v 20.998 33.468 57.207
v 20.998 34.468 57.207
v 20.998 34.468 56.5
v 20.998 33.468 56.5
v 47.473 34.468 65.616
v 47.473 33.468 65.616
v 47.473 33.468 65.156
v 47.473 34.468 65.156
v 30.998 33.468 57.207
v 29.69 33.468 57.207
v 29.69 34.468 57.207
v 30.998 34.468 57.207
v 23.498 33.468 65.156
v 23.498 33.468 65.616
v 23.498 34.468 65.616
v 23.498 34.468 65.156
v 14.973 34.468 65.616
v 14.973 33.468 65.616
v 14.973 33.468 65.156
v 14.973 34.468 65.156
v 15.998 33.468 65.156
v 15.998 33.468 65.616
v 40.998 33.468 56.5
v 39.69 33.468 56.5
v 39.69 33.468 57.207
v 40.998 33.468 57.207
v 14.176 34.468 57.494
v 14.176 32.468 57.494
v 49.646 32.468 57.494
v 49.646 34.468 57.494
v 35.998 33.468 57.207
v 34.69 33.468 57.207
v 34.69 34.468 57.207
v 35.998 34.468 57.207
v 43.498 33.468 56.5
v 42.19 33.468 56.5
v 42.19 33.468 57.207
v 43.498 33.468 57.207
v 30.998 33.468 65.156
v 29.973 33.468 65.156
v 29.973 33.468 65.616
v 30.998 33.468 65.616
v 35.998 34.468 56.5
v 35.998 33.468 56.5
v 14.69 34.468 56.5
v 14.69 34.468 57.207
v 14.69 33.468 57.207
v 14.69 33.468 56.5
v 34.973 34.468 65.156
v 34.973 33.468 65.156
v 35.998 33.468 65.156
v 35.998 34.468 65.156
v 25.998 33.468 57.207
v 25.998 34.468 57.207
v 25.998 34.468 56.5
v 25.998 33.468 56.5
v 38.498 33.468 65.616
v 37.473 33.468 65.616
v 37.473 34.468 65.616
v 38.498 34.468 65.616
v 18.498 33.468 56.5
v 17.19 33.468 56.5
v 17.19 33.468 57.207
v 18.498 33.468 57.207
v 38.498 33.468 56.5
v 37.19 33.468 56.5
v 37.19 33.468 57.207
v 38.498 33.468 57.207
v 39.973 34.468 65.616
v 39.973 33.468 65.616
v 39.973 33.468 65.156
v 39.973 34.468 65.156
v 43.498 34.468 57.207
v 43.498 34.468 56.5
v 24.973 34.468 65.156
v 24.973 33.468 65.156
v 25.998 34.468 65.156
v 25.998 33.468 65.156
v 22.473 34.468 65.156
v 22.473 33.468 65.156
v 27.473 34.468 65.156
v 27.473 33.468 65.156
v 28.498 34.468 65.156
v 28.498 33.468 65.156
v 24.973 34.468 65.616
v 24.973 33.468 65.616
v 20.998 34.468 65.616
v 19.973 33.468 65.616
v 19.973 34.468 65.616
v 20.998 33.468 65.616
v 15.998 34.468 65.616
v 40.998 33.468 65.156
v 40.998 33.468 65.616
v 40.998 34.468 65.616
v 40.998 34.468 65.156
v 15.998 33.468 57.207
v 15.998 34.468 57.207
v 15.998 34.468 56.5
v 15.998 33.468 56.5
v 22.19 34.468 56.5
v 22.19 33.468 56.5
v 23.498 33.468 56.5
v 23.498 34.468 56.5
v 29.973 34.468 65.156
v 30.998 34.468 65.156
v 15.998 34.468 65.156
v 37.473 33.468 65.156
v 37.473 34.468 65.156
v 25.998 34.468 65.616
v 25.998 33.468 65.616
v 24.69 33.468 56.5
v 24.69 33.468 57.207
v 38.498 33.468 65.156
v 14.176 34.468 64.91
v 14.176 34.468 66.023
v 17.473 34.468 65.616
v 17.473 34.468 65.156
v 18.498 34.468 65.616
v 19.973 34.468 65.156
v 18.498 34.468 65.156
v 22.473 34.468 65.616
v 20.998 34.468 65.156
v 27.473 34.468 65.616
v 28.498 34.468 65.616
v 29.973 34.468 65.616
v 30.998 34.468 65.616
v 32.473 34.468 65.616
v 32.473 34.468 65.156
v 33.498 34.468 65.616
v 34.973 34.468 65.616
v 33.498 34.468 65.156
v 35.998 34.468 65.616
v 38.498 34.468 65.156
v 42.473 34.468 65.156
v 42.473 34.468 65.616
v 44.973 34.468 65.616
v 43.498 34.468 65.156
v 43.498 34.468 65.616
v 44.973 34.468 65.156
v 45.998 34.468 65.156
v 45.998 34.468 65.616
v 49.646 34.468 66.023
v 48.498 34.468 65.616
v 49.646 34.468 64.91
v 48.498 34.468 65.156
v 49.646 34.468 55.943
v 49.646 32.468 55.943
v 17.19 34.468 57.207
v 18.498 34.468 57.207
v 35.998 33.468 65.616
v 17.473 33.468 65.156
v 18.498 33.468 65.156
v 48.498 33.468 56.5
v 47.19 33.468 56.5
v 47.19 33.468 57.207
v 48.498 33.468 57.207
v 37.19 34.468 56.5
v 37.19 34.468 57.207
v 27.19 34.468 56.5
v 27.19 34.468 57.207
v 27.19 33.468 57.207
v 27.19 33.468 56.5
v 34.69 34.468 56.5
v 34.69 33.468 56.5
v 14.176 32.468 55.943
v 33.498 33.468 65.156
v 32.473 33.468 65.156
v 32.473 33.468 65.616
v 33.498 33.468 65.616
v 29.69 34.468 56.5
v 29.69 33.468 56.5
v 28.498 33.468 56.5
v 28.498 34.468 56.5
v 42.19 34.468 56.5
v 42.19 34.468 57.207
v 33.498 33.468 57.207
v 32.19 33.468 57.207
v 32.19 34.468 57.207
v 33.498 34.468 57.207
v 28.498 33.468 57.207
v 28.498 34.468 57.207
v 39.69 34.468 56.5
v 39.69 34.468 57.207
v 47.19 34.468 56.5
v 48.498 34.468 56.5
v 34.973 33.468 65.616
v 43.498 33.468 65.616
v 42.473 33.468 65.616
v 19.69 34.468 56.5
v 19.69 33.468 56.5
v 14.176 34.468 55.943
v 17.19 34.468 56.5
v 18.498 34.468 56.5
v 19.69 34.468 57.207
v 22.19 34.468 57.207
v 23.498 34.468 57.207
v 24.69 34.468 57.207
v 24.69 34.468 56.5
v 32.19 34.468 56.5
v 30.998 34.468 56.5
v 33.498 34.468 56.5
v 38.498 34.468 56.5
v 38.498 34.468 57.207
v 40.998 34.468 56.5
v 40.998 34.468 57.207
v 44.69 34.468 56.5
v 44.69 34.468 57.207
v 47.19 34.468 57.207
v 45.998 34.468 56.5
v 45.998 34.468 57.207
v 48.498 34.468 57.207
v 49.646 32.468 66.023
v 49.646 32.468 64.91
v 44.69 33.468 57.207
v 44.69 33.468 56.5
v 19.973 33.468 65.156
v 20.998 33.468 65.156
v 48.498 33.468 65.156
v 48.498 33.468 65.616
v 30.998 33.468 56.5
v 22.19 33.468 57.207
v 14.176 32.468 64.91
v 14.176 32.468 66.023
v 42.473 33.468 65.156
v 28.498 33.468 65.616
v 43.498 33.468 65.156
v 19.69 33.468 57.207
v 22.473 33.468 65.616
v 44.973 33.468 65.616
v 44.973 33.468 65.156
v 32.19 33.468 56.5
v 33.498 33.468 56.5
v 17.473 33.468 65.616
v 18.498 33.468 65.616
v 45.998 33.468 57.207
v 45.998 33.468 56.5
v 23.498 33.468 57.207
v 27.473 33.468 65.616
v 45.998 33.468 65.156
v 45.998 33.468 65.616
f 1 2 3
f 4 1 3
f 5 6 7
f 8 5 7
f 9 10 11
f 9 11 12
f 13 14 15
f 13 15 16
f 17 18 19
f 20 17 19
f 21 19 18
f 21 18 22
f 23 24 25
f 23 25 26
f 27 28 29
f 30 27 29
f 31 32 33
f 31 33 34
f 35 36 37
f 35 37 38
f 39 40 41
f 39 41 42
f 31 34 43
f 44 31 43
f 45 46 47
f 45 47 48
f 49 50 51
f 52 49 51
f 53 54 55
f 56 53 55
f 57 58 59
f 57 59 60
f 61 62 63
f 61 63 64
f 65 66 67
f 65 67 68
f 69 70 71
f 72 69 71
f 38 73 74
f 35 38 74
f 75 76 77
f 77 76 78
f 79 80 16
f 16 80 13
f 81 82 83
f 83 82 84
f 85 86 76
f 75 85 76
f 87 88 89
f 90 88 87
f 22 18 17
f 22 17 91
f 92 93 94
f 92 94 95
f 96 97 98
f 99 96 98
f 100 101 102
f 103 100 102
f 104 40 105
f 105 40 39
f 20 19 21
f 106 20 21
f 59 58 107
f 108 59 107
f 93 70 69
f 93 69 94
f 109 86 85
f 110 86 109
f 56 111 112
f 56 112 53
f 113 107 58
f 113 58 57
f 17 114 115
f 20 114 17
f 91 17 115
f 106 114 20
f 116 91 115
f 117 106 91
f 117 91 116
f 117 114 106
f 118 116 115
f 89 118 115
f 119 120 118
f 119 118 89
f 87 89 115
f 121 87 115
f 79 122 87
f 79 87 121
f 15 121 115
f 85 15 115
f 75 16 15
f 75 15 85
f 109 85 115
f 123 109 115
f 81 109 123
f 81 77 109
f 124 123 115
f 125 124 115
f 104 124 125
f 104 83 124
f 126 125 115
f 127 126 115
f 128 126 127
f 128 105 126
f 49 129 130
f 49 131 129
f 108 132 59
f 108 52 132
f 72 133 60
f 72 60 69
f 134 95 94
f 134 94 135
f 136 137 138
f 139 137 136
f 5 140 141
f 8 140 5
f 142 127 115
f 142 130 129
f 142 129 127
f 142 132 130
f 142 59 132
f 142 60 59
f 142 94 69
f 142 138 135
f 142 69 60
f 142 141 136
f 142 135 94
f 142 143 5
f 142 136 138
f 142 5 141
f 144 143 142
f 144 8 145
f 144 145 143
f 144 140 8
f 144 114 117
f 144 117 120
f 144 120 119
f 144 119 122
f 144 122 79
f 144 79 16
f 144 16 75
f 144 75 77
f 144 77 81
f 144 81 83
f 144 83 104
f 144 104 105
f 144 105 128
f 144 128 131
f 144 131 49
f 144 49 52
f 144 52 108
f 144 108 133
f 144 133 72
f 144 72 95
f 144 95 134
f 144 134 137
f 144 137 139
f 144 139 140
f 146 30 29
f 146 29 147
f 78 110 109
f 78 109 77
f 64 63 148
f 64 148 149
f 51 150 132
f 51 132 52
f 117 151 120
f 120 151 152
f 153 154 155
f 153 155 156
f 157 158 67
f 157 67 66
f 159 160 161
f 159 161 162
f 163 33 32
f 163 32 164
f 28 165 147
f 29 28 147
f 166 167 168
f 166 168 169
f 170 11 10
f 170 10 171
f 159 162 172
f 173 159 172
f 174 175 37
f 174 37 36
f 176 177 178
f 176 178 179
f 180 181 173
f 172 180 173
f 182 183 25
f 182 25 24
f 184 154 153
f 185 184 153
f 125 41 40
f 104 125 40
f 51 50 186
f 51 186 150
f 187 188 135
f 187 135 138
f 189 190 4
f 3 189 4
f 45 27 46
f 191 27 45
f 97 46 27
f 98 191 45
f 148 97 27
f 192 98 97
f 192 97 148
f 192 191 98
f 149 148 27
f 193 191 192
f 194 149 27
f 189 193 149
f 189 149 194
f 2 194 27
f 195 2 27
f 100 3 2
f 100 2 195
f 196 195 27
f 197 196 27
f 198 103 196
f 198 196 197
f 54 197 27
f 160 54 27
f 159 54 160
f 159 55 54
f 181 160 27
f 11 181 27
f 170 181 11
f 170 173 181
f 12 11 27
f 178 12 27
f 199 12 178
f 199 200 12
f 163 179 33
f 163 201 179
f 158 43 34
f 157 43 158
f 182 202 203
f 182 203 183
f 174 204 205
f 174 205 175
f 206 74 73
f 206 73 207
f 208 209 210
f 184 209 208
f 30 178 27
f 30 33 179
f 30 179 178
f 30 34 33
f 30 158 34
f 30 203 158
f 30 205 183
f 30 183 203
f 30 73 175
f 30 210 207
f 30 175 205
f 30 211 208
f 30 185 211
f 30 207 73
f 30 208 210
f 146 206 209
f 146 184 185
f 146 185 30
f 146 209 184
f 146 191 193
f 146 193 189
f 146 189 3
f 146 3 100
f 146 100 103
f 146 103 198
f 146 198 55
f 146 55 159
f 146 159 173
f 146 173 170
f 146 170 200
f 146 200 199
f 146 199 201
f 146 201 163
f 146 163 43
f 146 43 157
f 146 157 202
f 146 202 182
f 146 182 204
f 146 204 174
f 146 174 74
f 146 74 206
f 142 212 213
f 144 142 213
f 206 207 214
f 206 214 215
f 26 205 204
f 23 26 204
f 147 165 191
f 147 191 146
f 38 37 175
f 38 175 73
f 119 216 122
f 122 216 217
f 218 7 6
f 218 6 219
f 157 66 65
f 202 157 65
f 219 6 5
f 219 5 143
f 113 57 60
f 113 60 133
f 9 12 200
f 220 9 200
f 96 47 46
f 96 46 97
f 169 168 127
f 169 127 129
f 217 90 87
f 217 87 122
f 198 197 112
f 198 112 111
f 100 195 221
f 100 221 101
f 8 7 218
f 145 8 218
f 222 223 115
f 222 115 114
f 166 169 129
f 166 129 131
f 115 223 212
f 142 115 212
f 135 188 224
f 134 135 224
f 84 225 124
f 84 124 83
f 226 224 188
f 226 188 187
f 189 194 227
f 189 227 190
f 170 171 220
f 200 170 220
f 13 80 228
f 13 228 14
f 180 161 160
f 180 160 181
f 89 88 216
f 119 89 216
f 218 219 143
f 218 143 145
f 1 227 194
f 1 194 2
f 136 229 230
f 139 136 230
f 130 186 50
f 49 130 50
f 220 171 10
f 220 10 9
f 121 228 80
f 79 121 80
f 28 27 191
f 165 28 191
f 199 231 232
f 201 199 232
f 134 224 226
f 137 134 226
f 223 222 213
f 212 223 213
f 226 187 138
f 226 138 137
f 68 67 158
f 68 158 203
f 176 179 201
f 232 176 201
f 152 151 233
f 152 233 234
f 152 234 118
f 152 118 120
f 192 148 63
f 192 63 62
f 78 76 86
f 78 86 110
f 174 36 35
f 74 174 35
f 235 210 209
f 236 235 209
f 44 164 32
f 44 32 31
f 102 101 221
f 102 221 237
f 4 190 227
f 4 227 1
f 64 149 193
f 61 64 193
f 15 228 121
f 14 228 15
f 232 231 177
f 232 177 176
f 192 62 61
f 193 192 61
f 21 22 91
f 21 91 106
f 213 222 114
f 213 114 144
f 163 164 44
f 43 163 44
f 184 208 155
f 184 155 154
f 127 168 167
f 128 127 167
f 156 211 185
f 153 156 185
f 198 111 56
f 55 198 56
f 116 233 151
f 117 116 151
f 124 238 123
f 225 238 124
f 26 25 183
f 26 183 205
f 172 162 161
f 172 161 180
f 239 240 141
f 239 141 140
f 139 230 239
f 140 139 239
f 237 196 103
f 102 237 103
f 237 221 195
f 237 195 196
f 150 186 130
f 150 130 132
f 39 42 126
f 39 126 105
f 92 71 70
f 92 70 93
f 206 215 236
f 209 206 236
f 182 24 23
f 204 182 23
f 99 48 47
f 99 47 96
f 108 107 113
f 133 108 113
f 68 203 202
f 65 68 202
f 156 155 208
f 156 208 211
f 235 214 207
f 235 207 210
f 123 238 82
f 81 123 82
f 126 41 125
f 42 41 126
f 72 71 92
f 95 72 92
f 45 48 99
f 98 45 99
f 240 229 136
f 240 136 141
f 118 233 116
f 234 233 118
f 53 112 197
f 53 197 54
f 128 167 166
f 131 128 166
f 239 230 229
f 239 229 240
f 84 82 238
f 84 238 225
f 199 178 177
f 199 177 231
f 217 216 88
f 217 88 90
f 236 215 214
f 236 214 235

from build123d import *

# Parameters (mm, degrees)
CROQUIS1_W                = 35.470504615
CROQUIS1_H                = 1.551006647
CROQUIS1_W_2              = 1.307281122
CROQUIS1_H_2              = 0.706638445
SALIENTE_EXTRUIR1_DEPTH   = 2
CROQUIS1_H_3              = 1.112257887
CROQUIS1_W_3              = 1.024625744
CROQUIS1_H_4              = 0.459314989
SALIENTE_EXTRUIR1_2_DEPTH = 2
CROQUIS1_3_W              = 1.307281122
CROQUIS1_3_H              = 0.706638445
CROQUIS1_3_W_2            = 1.024625744
CROQUIS1_3_H_2            = 0.459314989
SALIENTE_EXTRUIR2_DEPTH   = 1


with BuildPart() as part:
    # Croquis1 → Saliente-Extruir1 (new body)
    with BuildSketch(Plane(origin=(0, 32.468175746, 0), x_dir=(1, 0, 0), z_dir=(0, 1, 0))):
        with Locations((31.911205321, -56.71845489)):
            Rectangle(CROQUIS1_W, CROQUIS1_H)
        with Locations((17.844131363, -56.853250782)):
            Rectangle(CROQUIS1_W_2, CROQUIS1_H_2, mode=Mode.SUBTRACT)
        with Locations((15.344131363, -56.853250782)):
            Rectangle(CROQUIS1_W_2, CROQUIS1_H_2, mode=Mode.SUBTRACT)
        with Locations((20.344131363, -56.853250782)):
            Rectangle(CROQUIS1_W_2, CROQUIS1_H_2, mode=Mode.SUBTRACT)
        with Locations((22.844131363, -56.853250782)):
            Rectangle(CROQUIS1_W_2, CROQUIS1_H_2, mode=Mode.SUBTRACT)
        with Locations((25.344131363, -56.853250782)):
            Rectangle(CROQUIS1_W_2, CROQUIS1_H_2, mode=Mode.SUBTRACT)
        with Locations((27.844131363, -56.853250782)):
            Rectangle(CROQUIS1_W_2, CROQUIS1_H_2, mode=Mode.SUBTRACT)
        with Locations((30.344131363, -56.853250782)):
            Rectangle(CROQUIS1_W_2, CROQUIS1_H_2, mode=Mode.SUBTRACT)
        with Locations((32.844131363, -56.853250782)):
            Rectangle(CROQUIS1_W_2, CROQUIS1_H_2, mode=Mode.SUBTRACT)
        with Locations((35.344131363, -56.853250782)):
            Rectangle(CROQUIS1_W_2, CROQUIS1_H_2, mode=Mode.SUBTRACT)
        with Locations((37.844131363, -56.853250782)):
            Rectangle(CROQUIS1_W_2, CROQUIS1_H_2, mode=Mode.SUBTRACT)
        with Locations((40.344131363, -56.853250782)):
            Rectangle(CROQUIS1_W_2, CROQUIS1_H_2, mode=Mode.SUBTRACT)
        with Locations((42.844131363, -56.853250782)):
            Rectangle(CROQUIS1_W_2, CROQUIS1_H_2, mode=Mode.SUBTRACT)
        with Locations((45.344131363, -56.853250782)):
            Rectangle(CROQUIS1_W_2, CROQUIS1_H_2, mode=Mode.SUBTRACT)
        with Locations((47.844131363, -56.853250782)):
            Rectangle(CROQUIS1_W_2, CROQUIS1_H_2, mode=Mode.SUBTRACT)
    extrude(amount=SALIENTE_EXTRUIR1_DEPTH)



with BuildPart() as body_2:
    # Croquis1 → Saliente-Extruir1 2 (new body)
    with BuildSketch(Plane(origin=(0, 32.468175746, 0), x_dir=(1, 0, 0), z_dir=(0, 1, 0))):
        with Locations((31.911205321, -65.466420603)):
            Rectangle(CROQUIS1_W, CROQUIS1_H_3)
        with Locations((15.485459052, -65.385910001)):
            Rectangle(CROQUIS1_W_3, CROQUIS1_H_4, mode=Mode.SUBTRACT)
        with Locations((17.985459052, -65.385910001)):
            Rectangle(CROQUIS1_W_3, CROQUIS1_H_4, mode=Mode.SUBTRACT)
        with Locations((20.485459052, -65.385910001)):
            Rectangle(CROQUIS1_W_3, CROQUIS1_H_4, mode=Mode.SUBTRACT)
        with Locations((22.985459052, -65.385910001)):
            Rectangle(CROQUIS1_W_3, CROQUIS1_H_4, mode=Mode.SUBTRACT)
        with Locations((25.485459052, -65.385910001)):
            Rectangle(CROQUIS1_W_3, CROQUIS1_H_4, mode=Mode.SUBTRACT)
        with Locations((27.985459052, -65.385910001)):
            Rectangle(CROQUIS1_W_3, CROQUIS1_H_4, mode=Mode.SUBTRACT)
        with Locations((30.485459052, -65.385910001)):
            Rectangle(CROQUIS1_W_3, CROQUIS1_H_4, mode=Mode.SUBTRACT)
        with Locations((32.985459052, -65.385910001)):
            Rectangle(CROQUIS1_W_3, CROQUIS1_H_4, mode=Mode.SUBTRACT)
        with Locations((35.485459052, -65.385910001)):
            Rectangle(CROQUIS1_W_3, CROQUIS1_H_4, mode=Mode.SUBTRACT)
        with Locations((37.985459052, -65.385910001)):
            Rectangle(CROQUIS1_W_3, CROQUIS1_H_4, mode=Mode.SUBTRACT)
        with Locations((40.485459052, -65.385910001)):
            Rectangle(CROQUIS1_W_3, CROQUIS1_H_4, mode=Mode.SUBTRACT)
        with Locations((42.985459052, -65.385910001)):
            Rectangle(CROQUIS1_W_3, CROQUIS1_H_4, mode=Mode.SUBTRACT)
        with Locations((45.485459052, -65.385910001)):
            Rectangle(CROQUIS1_W_3, CROQUIS1_H_4, mode=Mode.SUBTRACT)
        with Locations((47.985459052, -65.385910001)):
            Rectangle(CROQUIS1_W_3, CROQUIS1_H_4, mode=Mode.SUBTRACT)
    extrude(amount=SALIENTE_EXTRUIR1_2_DEPTH)


with BuildPart() as part_1:
    add(part.part)

    add(body_2.part)  # Saliente-Extruir2 merges body 2
    # Croquis1<3> → Saliente-Extruir2 (add)
    with BuildSketch(Plane(origin=(0, 32.468175746, 0), x_dir=(1, 0, 0), z_dir=(0, 1, 0))):
        with Locations((15.344131363, -56.853250782)):
            Rectangle(CROQUIS1_3_W, CROQUIS1_3_H)
        with Locations((17.844131363, -56.853250782)):
            Rectangle(CROQUIS1_3_W, CROQUIS1_3_H)
        with Locations((20.344131363, -56.853250782)):
            Rectangle(CROQUIS1_3_W, CROQUIS1_3_H)
        with Locations((22.844131363, -56.853250782)):
            Rectangle(CROQUIS1_3_W, CROQUIS1_3_H)
        with Locations((25.344131363, -56.853250782)):
            Rectangle(CROQUIS1_3_W, CROQUIS1_3_H)
        with Locations((27.844131363, -56.853250782)):
            Rectangle(CROQUIS1_3_W, CROQUIS1_3_H)
        with Locations((32.844131363, -56.853250782)):
            Rectangle(CROQUIS1_3_W, CROQUIS1_3_H)
        with Locations((35.344131363, -56.853250782)):
            Rectangle(CROQUIS1_3_W, CROQUIS1_3_H)
        with Locations((37.844131363, -56.853250782)):
            Rectangle(CROQUIS1_3_W, CROQUIS1_3_H)
        with Locations((40.344131363, -56.853250782)):
            Rectangle(CROQUIS1_3_W, CROQUIS1_3_H)
        with Locations((42.844131363, -56.853250782)):
            Rectangle(CROQUIS1_3_W, CROQUIS1_3_H)
        with Locations((47.844131363, -56.853250782)):
            Rectangle(CROQUIS1_3_W, CROQUIS1_3_H)
        with Locations((40.485459052, -65.385910001)):
            Rectangle(CROQUIS1_3_W_2, CROQUIS1_3_H_2)
        with Locations((37.985459052, -65.385910001)):
            Rectangle(CROQUIS1_3_W_2, CROQUIS1_3_H_2)
        with Locations((32.985459052, -65.385910001)):
            Rectangle(CROQUIS1_3_W_2, CROQUIS1_3_H_2)
        with Locations((30.485459052, -65.385910001)):
            Rectangle(CROQUIS1_3_W_2, CROQUIS1_3_H_2)
        with Locations((27.985459052, -65.385910001)):
            Rectangle(CROQUIS1_3_W_2, CROQUIS1_3_H_2)
        with Locations((25.485459052, -65.385910001)):
            Rectangle(CROQUIS1_3_W_2, CROQUIS1_3_H_2)
        with Locations((22.985459052, -65.385910001)):
            Rectangle(CROQUIS1_3_W_2, CROQUIS1_3_H_2)
        with Locations((20.485459052, -65.385910001)):
            Rectangle(CROQUIS1_3_W_2, CROQUIS1_3_H_2)
        with Locations((17.985459052, -65.385910001)):
            Rectangle(CROQUIS1_3_W_2, CROQUIS1_3_H_2)
        with Locations((15.485459052, -65.385910001)):
            Rectangle(CROQUIS1_3_W_2, CROQUIS1_3_H_2)
        with Locations((30.344131363, -56.853250782)):
            Rectangle(CROQUIS1_3_W, CROQUIS1_3_H)
        with Locations((45.344131363, -56.853250782)):
            Rectangle(CROQUIS1_3_W, CROQUIS1_3_H)
        with Locations((47.985459052, -65.385910001)):
            Rectangle(CROQUIS1_3_W_2, CROQUIS1_3_H_2)
        with Locations((45.485459052, -65.385910001)):
            Rectangle(CROQUIS1_3_W_2, CROQUIS1_3_H_2)
        with Locations((42.985459052, -65.385910001)):
            Rectangle(CROQUIS1_3_W_2, CROQUIS1_3_H_2)
        with Locations((35.485459052, -65.385910001)):
            Rectangle(CROQUIS1_3_W_2, CROQUIS1_3_H_2)
    extrude(amount=SALIENTE_EXTRUIR2_DEPTH)


solid = part_1.part
